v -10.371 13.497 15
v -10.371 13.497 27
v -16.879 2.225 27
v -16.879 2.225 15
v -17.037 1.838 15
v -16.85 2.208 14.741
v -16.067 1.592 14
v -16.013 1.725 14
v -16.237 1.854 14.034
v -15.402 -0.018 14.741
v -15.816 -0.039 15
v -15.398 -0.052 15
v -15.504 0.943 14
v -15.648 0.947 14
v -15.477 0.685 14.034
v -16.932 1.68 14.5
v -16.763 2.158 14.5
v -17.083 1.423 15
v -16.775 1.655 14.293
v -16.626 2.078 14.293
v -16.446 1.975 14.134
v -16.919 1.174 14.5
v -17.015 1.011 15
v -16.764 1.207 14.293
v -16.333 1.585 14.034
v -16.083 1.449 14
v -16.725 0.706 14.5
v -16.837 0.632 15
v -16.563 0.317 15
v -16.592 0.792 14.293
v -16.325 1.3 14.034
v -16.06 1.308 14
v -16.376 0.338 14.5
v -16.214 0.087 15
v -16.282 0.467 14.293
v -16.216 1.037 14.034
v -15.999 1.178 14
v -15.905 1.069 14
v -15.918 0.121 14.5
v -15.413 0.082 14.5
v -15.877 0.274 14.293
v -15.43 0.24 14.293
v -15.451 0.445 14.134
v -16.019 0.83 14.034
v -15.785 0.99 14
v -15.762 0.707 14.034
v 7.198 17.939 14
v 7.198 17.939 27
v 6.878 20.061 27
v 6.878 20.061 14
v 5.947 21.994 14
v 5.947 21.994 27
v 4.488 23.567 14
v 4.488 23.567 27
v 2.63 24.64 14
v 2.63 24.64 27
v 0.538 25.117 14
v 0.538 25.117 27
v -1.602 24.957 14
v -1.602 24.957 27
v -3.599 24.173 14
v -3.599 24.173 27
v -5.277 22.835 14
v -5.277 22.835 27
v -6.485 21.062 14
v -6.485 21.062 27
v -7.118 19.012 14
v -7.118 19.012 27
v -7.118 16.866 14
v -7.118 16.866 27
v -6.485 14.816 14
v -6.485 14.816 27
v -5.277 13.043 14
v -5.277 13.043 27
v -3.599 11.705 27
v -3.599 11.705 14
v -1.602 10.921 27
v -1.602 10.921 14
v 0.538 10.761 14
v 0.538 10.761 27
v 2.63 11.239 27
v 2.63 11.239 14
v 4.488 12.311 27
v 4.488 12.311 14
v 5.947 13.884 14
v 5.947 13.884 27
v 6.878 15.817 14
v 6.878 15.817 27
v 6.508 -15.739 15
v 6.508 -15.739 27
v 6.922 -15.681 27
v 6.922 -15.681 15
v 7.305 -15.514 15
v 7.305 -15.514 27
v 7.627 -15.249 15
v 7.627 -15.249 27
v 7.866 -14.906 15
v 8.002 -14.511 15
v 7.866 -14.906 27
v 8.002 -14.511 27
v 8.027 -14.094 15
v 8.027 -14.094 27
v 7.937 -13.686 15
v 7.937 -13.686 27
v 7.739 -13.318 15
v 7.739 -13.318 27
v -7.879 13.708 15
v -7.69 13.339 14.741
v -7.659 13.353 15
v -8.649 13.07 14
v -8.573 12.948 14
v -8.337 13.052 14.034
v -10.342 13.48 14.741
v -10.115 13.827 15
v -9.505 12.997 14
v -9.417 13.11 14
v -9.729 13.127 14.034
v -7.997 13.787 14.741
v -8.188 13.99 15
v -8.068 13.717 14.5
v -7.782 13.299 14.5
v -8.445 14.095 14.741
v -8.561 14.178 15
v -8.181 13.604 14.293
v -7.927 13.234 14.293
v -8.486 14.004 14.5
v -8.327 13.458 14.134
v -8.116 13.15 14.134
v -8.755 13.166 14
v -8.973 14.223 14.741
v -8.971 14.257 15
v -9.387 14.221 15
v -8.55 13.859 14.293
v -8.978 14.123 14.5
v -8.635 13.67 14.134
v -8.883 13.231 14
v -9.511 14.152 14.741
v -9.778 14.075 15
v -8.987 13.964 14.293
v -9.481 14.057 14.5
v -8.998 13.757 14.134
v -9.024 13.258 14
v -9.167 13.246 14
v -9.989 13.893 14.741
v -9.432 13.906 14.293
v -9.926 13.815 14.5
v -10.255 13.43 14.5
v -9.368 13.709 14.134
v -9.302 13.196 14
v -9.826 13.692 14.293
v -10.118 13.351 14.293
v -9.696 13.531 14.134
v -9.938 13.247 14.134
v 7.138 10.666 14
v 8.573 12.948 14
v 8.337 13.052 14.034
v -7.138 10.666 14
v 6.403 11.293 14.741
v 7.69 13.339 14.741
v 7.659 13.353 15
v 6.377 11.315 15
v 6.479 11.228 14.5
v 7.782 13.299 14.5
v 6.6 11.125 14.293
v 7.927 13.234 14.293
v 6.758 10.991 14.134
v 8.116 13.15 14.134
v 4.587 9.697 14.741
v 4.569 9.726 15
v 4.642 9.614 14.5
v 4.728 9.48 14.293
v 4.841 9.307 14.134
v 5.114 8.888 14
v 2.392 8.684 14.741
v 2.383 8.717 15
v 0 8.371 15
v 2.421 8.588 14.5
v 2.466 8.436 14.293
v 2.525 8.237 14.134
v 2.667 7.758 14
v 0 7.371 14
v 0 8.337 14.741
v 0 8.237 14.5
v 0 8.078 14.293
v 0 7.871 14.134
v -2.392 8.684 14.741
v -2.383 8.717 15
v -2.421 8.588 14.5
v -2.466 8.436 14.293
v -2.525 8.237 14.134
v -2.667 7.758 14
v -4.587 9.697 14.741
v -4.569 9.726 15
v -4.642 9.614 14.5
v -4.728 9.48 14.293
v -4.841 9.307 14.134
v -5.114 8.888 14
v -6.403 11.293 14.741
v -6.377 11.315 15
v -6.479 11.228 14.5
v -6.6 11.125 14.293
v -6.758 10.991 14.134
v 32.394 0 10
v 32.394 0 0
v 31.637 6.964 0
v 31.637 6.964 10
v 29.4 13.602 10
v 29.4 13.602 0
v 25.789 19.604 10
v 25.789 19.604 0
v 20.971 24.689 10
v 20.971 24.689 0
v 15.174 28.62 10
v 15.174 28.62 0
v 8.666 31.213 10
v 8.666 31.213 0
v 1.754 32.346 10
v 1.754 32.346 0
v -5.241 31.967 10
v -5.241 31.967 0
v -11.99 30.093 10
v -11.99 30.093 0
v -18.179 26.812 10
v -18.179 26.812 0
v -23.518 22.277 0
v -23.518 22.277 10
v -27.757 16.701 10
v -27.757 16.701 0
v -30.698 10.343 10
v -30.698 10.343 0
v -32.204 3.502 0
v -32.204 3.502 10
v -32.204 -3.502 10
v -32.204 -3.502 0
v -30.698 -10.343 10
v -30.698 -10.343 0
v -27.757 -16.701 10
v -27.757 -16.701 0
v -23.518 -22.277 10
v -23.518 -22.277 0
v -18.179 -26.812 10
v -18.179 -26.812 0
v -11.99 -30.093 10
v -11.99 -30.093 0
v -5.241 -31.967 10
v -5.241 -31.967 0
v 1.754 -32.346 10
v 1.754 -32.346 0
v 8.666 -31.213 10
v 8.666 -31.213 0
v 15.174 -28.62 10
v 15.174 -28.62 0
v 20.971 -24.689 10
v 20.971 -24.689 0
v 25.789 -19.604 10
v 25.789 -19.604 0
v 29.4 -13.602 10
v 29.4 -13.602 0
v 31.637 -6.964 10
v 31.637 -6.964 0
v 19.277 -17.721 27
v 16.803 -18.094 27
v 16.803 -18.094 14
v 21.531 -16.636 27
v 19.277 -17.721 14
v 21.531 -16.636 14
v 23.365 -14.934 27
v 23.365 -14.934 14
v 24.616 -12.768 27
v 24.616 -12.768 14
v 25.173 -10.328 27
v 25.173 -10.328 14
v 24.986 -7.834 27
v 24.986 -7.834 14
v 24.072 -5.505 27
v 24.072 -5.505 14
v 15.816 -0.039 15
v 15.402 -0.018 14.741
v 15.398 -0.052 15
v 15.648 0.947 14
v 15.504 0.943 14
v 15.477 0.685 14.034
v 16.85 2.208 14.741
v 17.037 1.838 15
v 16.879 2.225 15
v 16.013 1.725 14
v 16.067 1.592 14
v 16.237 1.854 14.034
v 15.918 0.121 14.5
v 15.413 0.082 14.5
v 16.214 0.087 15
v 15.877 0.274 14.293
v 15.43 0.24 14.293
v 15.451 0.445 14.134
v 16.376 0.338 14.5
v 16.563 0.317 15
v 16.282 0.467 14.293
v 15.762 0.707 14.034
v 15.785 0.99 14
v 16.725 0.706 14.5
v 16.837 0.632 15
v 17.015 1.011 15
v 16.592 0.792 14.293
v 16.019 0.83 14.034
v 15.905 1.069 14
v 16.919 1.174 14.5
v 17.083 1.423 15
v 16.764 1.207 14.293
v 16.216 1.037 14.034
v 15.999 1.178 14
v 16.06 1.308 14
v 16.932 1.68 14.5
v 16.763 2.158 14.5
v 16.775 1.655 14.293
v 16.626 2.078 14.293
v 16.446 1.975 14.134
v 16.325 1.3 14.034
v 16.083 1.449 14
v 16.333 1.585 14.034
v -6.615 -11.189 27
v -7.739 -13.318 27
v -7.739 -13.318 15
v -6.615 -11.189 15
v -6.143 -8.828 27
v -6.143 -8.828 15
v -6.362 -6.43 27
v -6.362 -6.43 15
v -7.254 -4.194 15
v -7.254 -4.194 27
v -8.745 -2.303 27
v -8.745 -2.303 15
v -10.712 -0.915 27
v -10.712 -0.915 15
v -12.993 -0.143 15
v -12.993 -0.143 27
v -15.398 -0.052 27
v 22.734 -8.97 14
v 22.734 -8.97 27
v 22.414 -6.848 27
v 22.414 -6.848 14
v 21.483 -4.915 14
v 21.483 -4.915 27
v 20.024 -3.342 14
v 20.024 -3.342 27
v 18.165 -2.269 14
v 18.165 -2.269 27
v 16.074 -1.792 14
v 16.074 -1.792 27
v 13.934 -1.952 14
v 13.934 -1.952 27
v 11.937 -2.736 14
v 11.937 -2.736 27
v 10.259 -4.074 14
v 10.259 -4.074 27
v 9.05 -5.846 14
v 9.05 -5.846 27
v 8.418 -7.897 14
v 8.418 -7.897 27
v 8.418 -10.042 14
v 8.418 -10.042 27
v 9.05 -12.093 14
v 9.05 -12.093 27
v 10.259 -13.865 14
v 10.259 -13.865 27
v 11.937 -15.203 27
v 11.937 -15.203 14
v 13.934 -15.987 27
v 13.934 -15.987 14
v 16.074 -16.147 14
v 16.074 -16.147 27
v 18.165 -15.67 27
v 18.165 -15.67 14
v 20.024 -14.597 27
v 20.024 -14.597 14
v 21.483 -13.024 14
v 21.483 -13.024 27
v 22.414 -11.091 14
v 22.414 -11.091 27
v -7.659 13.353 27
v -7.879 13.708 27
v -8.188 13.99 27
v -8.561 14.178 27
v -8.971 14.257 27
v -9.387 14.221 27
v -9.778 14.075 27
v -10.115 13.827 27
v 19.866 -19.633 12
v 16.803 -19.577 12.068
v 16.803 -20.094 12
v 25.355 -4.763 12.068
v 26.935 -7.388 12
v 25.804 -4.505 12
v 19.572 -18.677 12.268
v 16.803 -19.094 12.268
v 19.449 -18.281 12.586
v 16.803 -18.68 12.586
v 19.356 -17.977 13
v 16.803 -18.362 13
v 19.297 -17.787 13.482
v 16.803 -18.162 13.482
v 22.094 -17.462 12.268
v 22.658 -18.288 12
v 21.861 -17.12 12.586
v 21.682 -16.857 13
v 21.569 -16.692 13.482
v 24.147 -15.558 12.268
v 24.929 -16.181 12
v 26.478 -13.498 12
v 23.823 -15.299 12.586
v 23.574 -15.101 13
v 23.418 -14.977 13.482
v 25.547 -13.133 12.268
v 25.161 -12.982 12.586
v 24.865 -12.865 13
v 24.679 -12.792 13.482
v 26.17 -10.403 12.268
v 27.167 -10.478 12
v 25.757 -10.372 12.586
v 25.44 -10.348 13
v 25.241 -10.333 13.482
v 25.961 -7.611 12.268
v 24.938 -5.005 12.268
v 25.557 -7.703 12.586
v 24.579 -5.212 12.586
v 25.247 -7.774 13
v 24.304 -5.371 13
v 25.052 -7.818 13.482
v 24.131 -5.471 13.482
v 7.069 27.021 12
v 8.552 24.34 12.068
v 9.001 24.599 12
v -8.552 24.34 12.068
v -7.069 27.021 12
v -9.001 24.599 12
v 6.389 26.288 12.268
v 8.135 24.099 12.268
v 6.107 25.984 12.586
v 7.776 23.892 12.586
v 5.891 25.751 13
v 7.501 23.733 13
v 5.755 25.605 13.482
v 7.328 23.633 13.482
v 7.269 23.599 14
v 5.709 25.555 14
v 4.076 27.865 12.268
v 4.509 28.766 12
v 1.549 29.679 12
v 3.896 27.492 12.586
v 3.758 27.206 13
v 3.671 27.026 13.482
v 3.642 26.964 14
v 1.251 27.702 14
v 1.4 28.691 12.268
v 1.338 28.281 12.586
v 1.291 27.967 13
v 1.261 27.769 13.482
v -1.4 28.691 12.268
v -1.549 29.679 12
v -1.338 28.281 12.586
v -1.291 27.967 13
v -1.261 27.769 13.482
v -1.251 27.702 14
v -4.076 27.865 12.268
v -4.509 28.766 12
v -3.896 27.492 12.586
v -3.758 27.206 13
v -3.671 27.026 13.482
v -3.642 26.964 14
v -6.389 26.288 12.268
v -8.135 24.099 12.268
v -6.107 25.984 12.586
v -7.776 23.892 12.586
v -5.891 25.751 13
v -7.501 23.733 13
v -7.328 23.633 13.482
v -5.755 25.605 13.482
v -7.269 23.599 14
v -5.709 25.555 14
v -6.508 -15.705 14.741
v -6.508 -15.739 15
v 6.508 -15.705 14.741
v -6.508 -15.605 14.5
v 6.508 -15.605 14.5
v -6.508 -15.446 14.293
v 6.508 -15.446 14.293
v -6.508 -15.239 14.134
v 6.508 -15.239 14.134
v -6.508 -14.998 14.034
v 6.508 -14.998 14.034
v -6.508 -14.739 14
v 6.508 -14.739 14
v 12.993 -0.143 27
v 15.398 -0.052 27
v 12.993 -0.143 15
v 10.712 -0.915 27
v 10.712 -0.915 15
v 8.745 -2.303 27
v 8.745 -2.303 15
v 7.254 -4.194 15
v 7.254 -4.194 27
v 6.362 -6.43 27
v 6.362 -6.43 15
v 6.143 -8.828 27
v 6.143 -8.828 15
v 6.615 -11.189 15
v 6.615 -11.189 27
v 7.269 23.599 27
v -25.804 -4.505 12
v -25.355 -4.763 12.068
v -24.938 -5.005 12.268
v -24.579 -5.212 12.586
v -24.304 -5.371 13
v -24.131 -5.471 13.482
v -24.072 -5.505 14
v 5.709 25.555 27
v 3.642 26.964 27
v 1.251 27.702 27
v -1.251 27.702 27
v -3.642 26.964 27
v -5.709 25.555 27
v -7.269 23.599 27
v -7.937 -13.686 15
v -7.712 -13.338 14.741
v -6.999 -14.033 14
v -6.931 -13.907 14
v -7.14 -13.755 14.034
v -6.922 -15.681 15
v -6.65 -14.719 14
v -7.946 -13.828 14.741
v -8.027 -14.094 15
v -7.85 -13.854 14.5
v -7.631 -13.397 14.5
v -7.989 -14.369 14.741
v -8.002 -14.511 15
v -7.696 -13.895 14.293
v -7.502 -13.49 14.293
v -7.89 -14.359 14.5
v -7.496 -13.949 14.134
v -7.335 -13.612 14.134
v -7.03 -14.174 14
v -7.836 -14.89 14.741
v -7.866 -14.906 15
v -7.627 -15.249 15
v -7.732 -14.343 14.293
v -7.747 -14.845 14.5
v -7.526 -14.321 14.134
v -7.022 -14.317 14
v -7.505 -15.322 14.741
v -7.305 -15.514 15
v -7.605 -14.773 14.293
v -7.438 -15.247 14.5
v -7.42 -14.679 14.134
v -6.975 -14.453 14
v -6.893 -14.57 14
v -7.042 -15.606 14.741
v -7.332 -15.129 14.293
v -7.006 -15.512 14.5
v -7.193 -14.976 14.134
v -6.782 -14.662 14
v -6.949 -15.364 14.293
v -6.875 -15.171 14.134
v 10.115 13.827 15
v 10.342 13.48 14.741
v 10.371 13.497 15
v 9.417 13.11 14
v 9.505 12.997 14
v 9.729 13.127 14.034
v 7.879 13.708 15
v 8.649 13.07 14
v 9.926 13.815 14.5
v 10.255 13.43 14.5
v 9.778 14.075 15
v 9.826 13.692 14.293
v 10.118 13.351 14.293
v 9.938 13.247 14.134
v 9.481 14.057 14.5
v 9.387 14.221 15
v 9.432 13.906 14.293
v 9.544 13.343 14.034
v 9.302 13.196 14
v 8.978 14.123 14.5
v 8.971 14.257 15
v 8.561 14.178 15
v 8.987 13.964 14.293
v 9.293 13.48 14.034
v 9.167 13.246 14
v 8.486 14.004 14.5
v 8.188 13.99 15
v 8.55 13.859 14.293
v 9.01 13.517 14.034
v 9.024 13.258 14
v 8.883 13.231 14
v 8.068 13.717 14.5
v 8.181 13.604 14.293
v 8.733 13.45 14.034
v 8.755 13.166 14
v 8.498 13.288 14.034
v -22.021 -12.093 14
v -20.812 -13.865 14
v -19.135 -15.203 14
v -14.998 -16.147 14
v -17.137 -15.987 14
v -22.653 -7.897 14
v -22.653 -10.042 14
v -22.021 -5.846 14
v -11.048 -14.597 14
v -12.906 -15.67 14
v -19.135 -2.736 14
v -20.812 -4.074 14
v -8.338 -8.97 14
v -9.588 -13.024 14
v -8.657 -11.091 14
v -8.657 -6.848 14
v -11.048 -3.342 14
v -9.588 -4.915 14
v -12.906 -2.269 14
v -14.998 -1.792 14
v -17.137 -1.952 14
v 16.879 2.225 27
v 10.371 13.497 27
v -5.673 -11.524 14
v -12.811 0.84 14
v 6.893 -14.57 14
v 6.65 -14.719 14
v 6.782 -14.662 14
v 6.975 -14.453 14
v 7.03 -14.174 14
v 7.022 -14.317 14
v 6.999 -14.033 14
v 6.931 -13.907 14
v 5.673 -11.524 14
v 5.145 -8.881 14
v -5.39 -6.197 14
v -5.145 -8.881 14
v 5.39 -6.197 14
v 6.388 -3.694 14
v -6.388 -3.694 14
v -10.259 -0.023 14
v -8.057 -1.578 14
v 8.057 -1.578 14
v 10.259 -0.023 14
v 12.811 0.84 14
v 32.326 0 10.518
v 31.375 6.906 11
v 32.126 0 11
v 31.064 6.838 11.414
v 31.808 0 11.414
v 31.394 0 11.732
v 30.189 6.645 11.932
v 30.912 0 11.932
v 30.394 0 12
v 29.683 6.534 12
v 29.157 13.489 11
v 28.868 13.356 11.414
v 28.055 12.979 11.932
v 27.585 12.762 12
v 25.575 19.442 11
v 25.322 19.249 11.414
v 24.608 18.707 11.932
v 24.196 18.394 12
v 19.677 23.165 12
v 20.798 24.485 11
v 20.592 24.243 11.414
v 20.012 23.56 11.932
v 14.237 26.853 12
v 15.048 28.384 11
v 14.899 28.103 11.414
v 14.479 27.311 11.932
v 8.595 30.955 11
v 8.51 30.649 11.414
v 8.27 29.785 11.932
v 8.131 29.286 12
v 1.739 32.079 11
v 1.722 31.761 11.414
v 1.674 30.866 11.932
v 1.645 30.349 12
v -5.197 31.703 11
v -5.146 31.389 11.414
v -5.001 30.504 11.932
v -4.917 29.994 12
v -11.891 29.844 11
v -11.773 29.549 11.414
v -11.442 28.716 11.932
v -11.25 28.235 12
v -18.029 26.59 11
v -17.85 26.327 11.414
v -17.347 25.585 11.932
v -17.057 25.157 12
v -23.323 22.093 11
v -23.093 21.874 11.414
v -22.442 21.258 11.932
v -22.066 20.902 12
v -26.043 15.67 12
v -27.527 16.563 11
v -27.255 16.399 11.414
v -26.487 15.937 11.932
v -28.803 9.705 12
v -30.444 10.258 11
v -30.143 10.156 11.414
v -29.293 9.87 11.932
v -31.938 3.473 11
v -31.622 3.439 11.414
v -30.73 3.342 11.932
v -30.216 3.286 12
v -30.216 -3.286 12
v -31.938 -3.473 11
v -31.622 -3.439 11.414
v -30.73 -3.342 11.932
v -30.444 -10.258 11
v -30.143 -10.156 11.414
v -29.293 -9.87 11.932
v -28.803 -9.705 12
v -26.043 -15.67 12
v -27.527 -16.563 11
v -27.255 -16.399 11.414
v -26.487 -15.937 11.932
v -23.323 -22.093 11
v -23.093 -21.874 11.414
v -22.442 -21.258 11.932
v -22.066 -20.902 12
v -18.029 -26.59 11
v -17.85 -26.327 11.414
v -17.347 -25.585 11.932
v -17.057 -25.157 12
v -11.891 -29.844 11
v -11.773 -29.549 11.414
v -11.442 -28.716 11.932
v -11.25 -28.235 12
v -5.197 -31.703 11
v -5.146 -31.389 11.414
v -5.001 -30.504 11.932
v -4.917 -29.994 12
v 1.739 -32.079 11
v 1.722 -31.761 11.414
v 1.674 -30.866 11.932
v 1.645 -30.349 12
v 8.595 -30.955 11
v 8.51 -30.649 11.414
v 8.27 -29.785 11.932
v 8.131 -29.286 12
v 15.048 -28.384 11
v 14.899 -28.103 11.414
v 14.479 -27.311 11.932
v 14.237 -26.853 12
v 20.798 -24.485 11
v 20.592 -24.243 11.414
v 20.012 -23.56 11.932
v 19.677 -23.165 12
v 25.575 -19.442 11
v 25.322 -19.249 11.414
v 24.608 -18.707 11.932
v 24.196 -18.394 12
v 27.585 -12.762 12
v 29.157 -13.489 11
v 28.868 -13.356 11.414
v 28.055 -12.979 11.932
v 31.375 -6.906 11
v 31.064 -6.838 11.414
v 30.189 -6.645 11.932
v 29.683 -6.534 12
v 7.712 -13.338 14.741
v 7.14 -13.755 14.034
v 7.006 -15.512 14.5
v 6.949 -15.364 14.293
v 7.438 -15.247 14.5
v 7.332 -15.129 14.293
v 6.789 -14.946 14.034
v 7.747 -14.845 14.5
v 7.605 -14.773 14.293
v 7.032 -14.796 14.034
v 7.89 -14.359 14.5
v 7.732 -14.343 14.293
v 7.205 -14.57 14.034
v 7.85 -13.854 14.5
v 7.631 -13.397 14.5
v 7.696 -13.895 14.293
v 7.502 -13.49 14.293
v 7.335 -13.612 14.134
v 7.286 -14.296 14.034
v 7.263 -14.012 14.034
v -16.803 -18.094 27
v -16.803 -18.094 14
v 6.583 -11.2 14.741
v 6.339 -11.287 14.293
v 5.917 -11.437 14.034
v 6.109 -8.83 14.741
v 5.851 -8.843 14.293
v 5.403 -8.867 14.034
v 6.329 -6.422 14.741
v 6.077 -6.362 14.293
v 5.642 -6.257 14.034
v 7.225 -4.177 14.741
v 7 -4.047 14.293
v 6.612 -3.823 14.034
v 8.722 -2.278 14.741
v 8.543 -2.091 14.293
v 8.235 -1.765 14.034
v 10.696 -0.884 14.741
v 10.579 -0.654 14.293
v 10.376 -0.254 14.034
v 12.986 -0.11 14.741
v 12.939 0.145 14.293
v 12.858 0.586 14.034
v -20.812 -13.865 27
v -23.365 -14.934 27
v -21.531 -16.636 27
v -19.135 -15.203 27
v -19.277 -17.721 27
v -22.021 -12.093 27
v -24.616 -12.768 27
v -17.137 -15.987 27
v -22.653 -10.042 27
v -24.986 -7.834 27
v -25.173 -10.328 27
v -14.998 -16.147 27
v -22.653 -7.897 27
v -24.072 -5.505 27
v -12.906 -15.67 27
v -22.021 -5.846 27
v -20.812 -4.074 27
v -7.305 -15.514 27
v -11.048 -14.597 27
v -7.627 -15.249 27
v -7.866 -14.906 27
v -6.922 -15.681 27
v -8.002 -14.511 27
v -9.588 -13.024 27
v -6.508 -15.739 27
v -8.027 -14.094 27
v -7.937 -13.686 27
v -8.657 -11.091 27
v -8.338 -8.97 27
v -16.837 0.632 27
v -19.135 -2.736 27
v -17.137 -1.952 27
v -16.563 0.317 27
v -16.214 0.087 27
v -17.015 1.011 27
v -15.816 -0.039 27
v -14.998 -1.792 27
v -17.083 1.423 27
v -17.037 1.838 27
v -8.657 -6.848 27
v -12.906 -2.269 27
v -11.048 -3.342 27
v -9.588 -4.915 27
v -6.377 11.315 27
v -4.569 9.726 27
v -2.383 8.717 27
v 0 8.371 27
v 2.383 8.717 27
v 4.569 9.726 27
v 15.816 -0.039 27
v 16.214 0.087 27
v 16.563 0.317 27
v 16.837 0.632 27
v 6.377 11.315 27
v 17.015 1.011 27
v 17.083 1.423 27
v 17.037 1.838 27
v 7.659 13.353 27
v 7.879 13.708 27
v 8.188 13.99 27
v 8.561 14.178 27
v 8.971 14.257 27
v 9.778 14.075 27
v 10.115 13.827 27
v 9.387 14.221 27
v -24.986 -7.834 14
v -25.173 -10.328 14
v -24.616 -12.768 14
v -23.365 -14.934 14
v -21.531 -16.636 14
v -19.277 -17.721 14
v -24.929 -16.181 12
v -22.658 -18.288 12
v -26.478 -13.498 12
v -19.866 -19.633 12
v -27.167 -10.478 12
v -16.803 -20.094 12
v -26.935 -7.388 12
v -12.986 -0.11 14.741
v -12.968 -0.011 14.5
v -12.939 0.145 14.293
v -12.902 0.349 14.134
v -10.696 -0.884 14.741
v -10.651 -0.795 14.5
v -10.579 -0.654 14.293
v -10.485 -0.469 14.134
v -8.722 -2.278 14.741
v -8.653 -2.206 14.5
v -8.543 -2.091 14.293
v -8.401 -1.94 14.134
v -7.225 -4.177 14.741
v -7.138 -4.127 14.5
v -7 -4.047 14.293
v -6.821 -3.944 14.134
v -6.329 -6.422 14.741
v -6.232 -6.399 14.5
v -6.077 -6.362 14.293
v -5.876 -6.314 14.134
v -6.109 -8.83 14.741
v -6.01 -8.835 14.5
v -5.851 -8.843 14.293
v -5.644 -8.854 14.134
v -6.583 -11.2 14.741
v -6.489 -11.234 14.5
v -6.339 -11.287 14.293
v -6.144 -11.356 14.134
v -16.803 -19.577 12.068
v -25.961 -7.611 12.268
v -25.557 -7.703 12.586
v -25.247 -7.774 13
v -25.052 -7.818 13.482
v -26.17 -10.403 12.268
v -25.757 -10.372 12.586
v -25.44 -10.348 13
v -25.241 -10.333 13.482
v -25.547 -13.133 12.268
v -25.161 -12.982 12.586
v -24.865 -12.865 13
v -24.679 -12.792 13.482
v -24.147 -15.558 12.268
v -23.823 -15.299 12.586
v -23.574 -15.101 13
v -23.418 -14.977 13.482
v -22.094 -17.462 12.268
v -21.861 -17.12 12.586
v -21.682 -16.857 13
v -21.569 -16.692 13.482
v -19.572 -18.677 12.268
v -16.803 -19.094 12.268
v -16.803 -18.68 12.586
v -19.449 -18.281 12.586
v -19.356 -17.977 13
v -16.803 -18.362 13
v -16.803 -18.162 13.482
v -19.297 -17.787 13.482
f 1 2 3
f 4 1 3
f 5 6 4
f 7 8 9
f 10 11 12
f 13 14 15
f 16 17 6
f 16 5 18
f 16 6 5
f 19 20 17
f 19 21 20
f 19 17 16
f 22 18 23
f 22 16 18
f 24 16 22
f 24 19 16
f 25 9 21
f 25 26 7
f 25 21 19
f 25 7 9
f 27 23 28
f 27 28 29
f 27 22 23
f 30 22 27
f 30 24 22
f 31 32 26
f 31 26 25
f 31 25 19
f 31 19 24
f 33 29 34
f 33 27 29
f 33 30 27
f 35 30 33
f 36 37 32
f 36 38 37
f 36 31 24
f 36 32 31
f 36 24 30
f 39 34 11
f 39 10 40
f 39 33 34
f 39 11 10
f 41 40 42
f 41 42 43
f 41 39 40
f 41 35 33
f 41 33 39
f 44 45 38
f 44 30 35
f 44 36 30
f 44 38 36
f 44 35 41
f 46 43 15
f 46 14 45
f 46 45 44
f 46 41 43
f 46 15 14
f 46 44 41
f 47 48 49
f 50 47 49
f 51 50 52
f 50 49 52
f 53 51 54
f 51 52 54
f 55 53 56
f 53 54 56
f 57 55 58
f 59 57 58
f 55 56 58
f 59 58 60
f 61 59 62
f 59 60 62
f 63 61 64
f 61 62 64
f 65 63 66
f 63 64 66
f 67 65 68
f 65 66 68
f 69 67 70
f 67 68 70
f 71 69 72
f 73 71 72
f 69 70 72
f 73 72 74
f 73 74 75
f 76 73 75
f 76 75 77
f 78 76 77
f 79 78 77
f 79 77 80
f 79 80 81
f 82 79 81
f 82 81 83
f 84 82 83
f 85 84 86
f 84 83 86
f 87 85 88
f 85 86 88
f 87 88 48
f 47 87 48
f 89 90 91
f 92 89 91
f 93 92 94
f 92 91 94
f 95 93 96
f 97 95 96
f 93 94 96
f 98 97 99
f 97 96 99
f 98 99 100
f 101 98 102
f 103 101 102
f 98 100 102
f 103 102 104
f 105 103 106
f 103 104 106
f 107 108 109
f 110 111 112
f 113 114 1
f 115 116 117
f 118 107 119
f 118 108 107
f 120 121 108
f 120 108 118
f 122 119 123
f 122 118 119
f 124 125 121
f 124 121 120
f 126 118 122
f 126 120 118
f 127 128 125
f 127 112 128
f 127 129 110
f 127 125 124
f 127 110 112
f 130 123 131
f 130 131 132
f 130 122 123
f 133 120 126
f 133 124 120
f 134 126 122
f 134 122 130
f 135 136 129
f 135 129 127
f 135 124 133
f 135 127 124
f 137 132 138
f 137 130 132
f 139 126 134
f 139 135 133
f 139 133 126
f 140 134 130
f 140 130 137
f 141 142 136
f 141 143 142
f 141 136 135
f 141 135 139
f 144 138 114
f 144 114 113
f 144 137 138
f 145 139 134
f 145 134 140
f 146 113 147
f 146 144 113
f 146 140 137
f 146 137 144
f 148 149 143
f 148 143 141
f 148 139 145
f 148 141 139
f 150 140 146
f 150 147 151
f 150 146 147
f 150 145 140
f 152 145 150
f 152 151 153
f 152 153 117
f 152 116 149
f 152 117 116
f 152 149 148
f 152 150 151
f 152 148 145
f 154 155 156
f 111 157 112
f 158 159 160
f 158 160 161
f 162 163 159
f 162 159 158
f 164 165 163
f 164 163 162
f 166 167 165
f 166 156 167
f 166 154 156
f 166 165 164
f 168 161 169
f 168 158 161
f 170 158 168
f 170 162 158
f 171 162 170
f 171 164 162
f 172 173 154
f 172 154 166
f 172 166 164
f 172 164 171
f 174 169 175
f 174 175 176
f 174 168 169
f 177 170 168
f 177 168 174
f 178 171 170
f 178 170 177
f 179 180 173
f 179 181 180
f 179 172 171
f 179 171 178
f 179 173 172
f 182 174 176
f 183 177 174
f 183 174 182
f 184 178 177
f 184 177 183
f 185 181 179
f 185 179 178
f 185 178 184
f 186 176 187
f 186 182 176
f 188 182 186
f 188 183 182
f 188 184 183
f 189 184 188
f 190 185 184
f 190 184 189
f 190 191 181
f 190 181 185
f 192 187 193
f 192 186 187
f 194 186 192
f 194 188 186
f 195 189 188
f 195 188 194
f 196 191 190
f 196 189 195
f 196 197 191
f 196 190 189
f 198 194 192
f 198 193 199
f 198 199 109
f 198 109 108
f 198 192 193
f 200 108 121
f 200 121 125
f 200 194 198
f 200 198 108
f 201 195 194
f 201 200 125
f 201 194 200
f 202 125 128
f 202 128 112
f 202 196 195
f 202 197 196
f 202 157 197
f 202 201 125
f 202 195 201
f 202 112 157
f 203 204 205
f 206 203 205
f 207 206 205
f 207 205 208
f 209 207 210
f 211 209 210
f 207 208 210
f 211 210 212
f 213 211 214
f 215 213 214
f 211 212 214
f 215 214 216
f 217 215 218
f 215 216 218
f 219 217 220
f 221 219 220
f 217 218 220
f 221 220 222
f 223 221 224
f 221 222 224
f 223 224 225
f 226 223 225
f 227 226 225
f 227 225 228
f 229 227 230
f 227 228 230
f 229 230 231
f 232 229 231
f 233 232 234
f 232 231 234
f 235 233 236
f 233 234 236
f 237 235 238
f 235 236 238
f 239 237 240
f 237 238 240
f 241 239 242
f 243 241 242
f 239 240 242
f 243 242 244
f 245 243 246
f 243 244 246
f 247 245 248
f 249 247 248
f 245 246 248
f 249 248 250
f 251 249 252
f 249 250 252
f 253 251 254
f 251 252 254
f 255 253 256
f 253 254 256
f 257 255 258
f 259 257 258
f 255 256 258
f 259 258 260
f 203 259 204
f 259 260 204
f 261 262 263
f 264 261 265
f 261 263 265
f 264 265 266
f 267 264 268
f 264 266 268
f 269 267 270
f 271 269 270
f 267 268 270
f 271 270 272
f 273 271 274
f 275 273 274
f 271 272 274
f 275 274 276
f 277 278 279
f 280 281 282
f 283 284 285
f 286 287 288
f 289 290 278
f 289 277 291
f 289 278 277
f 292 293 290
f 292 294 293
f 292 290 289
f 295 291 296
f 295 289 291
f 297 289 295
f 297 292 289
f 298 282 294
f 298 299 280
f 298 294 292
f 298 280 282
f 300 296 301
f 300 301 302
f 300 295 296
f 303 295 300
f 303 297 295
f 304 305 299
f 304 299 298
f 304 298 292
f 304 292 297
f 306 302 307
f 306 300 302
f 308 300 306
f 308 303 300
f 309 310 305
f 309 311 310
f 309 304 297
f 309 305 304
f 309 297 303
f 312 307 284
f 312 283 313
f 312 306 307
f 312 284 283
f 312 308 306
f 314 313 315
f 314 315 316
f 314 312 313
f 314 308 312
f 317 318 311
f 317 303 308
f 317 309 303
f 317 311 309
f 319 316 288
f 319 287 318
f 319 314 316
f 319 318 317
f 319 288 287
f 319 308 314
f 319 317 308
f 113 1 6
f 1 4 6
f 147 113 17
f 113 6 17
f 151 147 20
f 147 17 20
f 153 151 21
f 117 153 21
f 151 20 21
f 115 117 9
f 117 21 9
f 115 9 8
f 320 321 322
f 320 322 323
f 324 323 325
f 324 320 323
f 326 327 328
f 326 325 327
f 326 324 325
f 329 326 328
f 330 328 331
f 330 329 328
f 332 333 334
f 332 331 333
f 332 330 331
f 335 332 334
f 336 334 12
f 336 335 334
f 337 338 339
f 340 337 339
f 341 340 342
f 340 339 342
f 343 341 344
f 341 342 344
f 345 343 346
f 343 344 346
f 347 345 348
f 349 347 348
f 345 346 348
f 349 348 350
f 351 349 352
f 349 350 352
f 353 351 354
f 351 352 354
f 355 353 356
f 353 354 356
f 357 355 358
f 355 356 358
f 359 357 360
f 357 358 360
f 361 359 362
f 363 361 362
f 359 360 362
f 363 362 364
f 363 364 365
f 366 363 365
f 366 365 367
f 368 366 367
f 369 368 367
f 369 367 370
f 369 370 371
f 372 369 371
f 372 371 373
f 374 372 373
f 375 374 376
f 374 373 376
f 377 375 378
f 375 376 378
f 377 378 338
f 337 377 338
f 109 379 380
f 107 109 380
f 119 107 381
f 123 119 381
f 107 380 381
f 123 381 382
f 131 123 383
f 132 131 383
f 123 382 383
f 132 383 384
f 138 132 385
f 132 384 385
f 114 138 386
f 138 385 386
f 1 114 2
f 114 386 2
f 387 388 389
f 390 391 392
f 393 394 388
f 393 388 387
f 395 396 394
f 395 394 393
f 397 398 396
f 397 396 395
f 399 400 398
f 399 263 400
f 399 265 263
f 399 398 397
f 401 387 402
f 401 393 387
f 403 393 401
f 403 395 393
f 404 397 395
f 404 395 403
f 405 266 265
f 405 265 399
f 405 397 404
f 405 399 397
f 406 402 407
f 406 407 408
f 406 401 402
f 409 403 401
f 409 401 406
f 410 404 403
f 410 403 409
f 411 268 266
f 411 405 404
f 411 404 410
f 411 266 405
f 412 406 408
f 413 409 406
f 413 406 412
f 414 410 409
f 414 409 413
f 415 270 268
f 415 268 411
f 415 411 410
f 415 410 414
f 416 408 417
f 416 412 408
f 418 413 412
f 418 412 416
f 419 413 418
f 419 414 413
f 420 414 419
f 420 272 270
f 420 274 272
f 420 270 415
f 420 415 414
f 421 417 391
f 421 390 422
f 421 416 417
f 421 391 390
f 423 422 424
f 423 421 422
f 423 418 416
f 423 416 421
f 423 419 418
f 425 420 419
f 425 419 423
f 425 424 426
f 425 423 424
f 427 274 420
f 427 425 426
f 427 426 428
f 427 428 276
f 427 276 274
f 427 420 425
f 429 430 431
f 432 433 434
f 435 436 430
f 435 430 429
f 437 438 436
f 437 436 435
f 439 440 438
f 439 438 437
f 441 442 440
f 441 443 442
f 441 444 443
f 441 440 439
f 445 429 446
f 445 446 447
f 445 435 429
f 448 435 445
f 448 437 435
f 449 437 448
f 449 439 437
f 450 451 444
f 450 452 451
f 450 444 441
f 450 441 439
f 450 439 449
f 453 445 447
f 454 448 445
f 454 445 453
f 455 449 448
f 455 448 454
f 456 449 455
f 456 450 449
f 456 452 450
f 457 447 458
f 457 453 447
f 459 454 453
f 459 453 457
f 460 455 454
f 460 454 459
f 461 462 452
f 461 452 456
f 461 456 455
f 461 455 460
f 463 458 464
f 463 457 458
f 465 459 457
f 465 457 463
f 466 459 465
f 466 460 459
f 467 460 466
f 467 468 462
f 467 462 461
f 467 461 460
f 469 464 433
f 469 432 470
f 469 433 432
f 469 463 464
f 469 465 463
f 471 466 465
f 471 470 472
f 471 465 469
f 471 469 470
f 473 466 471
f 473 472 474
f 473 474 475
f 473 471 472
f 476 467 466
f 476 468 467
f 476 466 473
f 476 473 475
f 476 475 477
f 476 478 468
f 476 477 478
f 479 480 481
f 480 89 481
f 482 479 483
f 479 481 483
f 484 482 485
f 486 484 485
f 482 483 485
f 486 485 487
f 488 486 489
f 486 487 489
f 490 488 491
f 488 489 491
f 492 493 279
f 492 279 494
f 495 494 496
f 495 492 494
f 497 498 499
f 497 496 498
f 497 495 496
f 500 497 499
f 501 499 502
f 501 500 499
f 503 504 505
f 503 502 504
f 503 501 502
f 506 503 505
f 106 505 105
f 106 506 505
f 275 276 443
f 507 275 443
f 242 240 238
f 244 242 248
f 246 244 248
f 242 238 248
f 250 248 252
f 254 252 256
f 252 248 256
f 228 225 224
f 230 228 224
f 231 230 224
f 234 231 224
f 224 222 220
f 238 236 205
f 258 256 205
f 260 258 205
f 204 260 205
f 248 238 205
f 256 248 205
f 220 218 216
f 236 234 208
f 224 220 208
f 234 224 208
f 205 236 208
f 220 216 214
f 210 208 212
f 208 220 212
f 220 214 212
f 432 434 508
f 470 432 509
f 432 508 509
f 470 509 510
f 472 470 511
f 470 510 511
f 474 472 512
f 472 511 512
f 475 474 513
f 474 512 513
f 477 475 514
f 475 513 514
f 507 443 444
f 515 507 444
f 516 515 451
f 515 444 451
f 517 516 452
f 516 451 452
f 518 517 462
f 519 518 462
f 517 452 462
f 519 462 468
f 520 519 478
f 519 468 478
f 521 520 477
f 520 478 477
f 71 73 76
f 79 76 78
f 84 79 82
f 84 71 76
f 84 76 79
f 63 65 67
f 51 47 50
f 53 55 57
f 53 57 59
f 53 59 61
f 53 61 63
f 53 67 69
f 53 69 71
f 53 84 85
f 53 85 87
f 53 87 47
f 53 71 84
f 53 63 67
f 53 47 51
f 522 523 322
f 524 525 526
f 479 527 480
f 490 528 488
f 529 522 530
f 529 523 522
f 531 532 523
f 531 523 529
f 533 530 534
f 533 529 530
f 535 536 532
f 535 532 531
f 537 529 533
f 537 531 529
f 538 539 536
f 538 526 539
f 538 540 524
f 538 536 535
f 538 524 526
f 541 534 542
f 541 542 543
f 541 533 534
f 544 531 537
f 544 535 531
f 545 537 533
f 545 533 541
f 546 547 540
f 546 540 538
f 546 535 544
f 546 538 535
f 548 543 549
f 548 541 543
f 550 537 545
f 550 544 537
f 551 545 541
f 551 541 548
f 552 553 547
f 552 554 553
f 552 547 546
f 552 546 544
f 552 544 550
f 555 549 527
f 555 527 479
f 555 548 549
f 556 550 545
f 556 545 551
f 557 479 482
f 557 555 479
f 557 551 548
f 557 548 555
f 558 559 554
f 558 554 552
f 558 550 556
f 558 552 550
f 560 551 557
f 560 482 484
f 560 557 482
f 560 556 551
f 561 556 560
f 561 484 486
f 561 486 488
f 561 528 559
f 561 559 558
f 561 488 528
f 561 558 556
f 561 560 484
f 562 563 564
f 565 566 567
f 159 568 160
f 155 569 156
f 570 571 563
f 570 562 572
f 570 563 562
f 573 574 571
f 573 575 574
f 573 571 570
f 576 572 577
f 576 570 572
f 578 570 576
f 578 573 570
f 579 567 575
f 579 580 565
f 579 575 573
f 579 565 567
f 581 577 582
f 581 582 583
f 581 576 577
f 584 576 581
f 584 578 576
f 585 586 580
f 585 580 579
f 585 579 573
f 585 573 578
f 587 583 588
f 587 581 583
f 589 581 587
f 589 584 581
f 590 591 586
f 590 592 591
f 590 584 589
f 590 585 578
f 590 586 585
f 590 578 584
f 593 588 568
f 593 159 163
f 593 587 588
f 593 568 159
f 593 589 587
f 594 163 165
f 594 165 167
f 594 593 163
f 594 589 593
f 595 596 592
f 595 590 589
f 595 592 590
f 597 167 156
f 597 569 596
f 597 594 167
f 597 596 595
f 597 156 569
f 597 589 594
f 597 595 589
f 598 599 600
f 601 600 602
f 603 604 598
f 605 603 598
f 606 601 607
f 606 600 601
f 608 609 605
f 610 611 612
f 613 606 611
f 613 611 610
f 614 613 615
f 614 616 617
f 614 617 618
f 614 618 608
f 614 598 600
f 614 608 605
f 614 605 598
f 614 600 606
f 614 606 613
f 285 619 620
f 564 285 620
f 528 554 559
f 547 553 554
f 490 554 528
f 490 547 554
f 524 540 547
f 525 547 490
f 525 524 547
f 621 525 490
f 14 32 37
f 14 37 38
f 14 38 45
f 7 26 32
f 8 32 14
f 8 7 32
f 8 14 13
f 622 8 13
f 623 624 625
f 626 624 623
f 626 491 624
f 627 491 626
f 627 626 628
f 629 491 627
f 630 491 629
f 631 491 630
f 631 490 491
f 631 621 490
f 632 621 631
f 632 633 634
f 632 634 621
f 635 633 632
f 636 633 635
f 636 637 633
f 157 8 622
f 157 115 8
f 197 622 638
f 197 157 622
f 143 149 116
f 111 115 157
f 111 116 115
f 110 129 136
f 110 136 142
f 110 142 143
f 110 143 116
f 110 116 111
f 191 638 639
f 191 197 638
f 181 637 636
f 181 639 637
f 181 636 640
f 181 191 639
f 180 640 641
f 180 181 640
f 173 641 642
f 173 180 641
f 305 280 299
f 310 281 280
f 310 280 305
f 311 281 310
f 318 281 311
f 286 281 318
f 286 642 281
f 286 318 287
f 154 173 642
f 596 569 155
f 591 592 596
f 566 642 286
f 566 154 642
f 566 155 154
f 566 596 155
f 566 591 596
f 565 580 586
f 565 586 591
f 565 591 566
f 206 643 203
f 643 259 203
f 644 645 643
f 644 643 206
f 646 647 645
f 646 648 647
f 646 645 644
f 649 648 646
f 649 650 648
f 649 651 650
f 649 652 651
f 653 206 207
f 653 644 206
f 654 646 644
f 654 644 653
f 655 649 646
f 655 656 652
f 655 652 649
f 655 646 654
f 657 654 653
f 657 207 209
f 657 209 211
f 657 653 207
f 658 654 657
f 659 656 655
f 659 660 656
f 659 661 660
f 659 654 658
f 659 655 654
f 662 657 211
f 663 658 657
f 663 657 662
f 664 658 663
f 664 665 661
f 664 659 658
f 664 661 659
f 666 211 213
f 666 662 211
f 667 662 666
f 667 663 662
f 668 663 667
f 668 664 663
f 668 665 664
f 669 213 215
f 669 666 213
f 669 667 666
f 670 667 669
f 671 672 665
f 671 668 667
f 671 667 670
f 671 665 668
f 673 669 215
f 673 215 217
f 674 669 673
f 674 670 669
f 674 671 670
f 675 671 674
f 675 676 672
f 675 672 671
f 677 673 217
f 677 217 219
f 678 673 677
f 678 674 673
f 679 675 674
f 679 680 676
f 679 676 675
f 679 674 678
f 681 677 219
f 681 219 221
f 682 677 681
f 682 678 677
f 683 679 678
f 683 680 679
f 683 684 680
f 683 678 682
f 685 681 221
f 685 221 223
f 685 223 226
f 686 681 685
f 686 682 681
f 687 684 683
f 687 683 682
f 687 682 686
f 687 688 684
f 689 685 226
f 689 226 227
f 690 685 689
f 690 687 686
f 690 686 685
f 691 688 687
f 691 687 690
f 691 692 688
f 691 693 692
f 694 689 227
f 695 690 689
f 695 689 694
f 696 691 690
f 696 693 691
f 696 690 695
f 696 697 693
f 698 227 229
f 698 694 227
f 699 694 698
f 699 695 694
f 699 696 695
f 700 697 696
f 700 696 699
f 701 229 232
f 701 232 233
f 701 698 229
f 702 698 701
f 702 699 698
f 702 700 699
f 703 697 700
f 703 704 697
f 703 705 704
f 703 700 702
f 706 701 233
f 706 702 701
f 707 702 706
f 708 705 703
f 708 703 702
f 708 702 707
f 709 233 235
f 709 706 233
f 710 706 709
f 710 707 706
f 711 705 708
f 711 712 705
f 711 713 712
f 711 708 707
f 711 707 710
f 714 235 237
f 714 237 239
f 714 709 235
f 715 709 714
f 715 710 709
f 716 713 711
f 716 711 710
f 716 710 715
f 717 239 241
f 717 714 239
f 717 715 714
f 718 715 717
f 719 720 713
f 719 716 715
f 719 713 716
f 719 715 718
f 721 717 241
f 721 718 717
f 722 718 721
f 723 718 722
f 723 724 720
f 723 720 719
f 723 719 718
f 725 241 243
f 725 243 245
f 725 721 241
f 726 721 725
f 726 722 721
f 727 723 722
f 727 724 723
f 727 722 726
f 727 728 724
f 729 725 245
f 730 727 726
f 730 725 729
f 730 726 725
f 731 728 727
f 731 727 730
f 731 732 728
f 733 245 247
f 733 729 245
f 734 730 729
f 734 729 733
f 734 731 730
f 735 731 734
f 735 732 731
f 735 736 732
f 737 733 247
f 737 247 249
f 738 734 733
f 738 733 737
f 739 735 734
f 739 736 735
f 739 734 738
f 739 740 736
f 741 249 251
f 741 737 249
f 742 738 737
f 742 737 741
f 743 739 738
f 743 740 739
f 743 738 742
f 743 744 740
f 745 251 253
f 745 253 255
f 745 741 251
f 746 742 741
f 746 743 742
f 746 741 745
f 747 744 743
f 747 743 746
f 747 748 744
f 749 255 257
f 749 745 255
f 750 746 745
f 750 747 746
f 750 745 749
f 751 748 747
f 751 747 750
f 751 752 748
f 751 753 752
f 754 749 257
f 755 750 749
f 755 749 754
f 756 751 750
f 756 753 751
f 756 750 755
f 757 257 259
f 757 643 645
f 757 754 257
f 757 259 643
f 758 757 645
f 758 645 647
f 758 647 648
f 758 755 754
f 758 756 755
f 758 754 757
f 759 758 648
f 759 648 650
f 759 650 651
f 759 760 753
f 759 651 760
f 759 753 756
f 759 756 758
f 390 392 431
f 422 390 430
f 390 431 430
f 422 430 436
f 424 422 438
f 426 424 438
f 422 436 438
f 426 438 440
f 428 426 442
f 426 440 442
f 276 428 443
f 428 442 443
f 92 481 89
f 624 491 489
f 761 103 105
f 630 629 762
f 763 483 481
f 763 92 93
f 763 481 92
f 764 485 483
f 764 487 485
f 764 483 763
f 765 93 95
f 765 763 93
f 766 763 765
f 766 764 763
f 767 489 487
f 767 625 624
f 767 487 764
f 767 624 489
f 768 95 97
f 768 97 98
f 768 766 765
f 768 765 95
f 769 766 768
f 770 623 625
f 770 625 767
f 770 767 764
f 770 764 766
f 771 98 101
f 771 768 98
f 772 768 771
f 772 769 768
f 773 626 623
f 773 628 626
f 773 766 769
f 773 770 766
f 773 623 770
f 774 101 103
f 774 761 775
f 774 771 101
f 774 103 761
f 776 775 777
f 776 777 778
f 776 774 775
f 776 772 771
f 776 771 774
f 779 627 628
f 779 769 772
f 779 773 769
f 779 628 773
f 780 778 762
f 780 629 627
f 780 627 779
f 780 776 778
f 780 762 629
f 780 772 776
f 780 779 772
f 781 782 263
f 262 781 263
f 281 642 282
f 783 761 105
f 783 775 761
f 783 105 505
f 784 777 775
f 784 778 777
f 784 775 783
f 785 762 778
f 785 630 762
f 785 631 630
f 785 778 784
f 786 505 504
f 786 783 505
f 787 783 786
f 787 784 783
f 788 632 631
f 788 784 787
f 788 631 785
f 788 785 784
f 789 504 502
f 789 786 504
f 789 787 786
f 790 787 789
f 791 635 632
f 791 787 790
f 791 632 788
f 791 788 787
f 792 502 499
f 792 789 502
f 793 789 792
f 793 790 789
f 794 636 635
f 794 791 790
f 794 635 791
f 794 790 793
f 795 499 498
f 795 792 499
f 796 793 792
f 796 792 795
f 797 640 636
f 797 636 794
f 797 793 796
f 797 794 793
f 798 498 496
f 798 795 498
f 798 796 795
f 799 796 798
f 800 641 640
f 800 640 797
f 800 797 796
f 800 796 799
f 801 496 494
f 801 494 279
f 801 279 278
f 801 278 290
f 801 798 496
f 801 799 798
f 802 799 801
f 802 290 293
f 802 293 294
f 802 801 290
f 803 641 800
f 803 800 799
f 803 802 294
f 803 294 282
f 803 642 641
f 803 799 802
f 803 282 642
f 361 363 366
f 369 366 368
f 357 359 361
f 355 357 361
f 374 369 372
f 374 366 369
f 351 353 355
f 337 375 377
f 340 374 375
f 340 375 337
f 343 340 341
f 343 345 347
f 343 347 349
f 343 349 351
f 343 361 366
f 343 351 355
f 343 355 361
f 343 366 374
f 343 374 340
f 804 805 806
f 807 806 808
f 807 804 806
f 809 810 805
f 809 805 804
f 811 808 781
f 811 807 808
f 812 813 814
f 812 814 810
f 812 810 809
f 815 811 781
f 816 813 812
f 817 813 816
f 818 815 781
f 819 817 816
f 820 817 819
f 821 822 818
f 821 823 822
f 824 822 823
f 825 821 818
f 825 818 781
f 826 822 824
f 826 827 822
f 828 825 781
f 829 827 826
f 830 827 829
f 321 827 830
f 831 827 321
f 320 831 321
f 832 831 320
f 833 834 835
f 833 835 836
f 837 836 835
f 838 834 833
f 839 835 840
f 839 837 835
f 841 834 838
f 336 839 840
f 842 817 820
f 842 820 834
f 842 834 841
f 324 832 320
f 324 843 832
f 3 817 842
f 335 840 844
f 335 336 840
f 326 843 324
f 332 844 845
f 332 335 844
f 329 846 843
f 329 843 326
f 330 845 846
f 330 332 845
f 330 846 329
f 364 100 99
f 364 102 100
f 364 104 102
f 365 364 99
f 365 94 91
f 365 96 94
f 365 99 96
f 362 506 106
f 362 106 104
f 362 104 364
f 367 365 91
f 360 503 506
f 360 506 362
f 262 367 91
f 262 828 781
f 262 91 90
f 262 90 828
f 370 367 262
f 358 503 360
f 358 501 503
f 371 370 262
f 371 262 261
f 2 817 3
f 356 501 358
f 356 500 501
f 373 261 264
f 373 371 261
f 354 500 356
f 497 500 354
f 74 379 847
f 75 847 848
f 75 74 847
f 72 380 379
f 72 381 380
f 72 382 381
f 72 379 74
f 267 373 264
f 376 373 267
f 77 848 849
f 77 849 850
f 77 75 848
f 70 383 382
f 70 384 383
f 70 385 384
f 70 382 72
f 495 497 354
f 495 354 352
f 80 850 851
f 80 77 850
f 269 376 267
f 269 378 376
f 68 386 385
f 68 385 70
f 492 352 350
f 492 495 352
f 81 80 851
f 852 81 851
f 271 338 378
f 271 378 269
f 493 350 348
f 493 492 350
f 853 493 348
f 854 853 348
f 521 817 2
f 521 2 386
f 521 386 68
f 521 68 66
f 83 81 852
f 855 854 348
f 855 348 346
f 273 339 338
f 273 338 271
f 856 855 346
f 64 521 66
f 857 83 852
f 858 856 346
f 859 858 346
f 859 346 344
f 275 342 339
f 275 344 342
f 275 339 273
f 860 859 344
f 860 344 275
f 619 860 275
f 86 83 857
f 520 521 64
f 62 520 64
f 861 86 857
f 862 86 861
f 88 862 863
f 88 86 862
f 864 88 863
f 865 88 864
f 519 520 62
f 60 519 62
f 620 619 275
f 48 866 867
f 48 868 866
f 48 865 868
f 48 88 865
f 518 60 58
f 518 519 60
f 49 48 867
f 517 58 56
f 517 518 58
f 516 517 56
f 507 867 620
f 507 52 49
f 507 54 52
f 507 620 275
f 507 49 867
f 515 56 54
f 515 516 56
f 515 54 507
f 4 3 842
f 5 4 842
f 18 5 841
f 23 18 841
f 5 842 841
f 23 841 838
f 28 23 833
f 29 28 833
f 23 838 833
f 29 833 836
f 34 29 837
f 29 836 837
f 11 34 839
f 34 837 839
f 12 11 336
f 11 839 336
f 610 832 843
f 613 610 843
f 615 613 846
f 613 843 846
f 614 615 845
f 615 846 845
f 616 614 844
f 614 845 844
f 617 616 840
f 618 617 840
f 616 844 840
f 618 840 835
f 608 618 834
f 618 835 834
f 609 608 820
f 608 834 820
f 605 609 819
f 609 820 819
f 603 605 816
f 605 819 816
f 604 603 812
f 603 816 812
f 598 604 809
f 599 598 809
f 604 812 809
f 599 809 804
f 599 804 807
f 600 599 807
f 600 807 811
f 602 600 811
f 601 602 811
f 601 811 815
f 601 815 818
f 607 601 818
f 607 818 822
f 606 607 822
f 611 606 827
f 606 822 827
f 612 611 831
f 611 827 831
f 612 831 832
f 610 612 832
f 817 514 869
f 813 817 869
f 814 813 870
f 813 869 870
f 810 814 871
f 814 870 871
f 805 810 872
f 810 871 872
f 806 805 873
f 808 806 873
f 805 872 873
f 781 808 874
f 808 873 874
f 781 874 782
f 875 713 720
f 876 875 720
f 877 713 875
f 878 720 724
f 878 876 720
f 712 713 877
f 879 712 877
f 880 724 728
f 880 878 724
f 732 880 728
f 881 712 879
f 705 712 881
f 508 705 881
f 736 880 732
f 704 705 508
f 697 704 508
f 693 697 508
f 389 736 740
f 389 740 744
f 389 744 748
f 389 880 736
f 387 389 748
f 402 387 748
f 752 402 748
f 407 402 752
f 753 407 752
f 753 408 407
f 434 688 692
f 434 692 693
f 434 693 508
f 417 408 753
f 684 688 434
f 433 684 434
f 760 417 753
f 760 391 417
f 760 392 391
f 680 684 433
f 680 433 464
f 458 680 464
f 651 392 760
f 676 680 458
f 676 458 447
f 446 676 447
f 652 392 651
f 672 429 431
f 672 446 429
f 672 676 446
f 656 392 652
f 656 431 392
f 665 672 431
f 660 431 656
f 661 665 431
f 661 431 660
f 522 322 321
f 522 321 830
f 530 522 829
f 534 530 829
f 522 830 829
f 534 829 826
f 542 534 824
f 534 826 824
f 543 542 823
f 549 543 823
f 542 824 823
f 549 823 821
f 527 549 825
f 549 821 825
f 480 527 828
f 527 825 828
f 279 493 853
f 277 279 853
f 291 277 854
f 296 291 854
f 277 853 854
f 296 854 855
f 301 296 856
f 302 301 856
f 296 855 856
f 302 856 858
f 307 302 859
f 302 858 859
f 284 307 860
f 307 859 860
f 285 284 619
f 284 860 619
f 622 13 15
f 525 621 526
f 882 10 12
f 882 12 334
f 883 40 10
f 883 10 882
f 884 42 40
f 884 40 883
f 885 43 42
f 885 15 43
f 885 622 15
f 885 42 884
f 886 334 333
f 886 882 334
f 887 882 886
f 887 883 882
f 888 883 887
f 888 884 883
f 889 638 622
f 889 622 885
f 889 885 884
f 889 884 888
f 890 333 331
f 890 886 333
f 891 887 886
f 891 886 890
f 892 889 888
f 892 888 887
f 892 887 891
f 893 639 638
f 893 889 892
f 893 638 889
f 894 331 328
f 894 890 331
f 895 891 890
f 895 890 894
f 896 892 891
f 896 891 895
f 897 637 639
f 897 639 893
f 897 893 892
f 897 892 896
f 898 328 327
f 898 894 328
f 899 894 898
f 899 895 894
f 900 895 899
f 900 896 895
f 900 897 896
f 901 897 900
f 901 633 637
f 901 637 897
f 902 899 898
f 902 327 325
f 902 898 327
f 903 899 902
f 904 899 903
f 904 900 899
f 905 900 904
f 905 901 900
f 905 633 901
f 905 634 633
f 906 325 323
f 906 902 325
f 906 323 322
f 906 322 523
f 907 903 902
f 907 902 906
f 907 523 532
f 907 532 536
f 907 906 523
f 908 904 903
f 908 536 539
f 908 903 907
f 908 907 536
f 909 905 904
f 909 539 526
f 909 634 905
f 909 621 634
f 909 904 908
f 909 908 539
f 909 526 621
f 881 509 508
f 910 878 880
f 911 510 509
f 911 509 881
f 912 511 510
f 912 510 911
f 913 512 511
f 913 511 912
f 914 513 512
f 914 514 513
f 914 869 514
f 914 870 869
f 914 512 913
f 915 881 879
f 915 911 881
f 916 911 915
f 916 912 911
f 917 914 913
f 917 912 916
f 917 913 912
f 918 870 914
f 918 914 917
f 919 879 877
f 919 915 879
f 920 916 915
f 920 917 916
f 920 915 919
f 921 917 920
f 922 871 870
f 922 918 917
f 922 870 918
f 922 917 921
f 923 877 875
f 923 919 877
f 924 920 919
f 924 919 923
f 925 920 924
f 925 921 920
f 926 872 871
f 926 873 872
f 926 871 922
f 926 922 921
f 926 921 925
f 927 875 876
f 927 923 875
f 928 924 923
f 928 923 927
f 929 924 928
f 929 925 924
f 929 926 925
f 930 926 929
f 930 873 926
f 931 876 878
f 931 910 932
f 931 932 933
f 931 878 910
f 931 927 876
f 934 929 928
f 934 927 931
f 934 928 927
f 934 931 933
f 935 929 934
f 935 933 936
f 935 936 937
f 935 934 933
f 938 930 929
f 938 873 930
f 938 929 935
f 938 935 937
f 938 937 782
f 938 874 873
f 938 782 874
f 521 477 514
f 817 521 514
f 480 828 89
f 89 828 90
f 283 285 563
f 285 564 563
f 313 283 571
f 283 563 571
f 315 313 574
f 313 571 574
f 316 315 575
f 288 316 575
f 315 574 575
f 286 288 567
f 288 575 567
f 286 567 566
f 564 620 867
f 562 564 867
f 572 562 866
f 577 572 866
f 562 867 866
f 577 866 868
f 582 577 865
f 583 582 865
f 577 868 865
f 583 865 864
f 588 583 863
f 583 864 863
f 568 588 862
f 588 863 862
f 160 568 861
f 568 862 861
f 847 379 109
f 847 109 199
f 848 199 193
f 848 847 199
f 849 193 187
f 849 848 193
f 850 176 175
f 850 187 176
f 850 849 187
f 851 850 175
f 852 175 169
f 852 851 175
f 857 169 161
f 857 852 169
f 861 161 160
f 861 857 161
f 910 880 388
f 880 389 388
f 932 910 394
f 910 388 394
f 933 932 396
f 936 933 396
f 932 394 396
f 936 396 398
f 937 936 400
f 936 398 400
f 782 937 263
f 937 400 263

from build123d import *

# Parameters (mm, degrees)
SKETCH_R        = 32.393895
PAD_DEPTH       = 12
FILLET_R        = 2
PAD001_DEPTH    = 15
FILLET001_R     = 2
POCKET_DEPTH    = 13
SKETCH003_R     = 7.198044
POCKET001_DEPTH = 13
FILLET002_R     = 1


with BuildPart() as part:
    # Sketch → Pad (new body)
    with BuildSketch(Plane.XY):
        Circle(SKETCH_R)
    extrude(amount=PAD_DEPTH)

    # Fillet
    fillet_edges = [part.edges().sort_by_distance(p)[0] for p in [
        (-32.393895, 0, 12),
    ]]
    fillet(fillet_edges, radius=FILLET_R)

    # Sketch001 (on Face4 of Fillet) → Pad001 (join)
    with BuildSketch(Plane.XY.offset(12)):
        with BuildLine():
            ThreePointArc((7.268672, 23.598905), (0, 27.795475), (-7.268672, 23.598905))
            Line((-7.268672, 23.598905), (-24.071587, -5.504598))
            ThreePointArc((-24.071587, -5.504598), (-24.071587, -13.897737), (-16.802915, -18.094307))
            Line((-16.802915, -18.094307), (16.802915, -18.094307))
            ThreePointArc((16.802915, -18.094307), (24.071587, -13.897737), (24.071587, -5.504598))
            Line((24.071587, -5.504598), (7.268672, 23.598905))
        make_face()
    extrude(amount=PAD001_DEPTH)

    # Fillet001
    fillet001_edges = [part.edges().sort_by_distance(p)[0] for p in [
        (-30.393895, 0, 12),
        (0, 27.795475, 12),
        (-15.67013, 9.047154, 12),
        (-24.071587, -13.897737, 12),
        (0, -18.094307, 12),
        (24.071587, -13.897737, 12),
        (15.67013, 9.047154, 12),
    ]]
    fillet(fillet001_edges, radius=FILLET001_R)

    # Sketch004 (on Face4 of Fillet) → Pocket (cut)
    with BuildSketch(Plane.XY.offset(27)):
        with BuildLine():
            Line((16.879342, 2.224883), (10.371309, 13.497127))
            ThreePointArc((10.371309, 13.497127), (8.97108, 14.2567), (7.659291, 13.352929))
            ThreePointArc((-7.659291, 13.352929), (0, 8.370647), (7.659291, 13.352929))
            ThreePointArc((-7.659291, 13.352929), (-8.97108, 14.2567), (-10.371309, 13.497127))
            Line((-10.371309, 13.497127), (-16.879342, 2.224883))
            ThreePointArc((-16.879342, 2.224883), (-16.837038, 0.632462), (-15.398454, -0.051695))
            ThreePointArc((-7.739163, -13.317976), (-7.254026, -4.193694), (-15.398454, -0.051695))
            ThreePointArc((-7.739163, -13.317976), (-7.865958, -14.905904), (-6.508033, -15.738752))
            Line((-6.508033, -15.738752), (6.508033, -15.738752))
            ThreePointArc((6.508033, -15.738752), (7.865958, -14.905904), (7.739163, -13.317976))
            ThreePointArc((15.398454, -0.051695), (7.254026, -4.193694), (7.739163, -13.317976))
            ThreePointArc((15.398454, -0.051695), (16.837038, 0.632462), (16.879342, 2.224883))
        make_face()
    extrude(amount=-POCKET_DEPTH, mode=Mode.SUBTRACT)

    # Sketch003 (on Face4 of Fillet) → Pocket001 (cut)
    with BuildSketch(Plane.XY.offset(27)):
        with Locations((-15.53568, -8.969529)):
            Circle(SKETCH003_R)
        with Locations((0, 17.939058)):
            Circle(SKETCH003_R)
        with Locations((15.53568, -8.969529)):
            Circle(SKETCH003_R)
    extrude(amount=-POCKET001_DEPTH, mode=Mode.SUBTRACT)

    # Fillet002
    fillet002_edges = [part.edges().sort_by_distance(p)[0] for p in [
        (16.837038, 0.632462, 14),
        (13.625326, 7.861005, 14),
        (8.97108, 14.2567, 14),
        (0, 8.370647, 14),
        (-8.97108, 14.2567, 14),
        (-13.625326, 7.861005, 14),
        (-16.837038, 0.632462, 14),
        (-7.254026, -4.193694, 14),
        (-7.865958, -14.905904, 14),
        (0, -15.738752, 14),
        (7.865958, -14.905904, 14),
        (7.254026, -4.193694, 14),
    ]]
    fillet(fillet002_edges, radius=FILLET002_R)


solid = part.part
